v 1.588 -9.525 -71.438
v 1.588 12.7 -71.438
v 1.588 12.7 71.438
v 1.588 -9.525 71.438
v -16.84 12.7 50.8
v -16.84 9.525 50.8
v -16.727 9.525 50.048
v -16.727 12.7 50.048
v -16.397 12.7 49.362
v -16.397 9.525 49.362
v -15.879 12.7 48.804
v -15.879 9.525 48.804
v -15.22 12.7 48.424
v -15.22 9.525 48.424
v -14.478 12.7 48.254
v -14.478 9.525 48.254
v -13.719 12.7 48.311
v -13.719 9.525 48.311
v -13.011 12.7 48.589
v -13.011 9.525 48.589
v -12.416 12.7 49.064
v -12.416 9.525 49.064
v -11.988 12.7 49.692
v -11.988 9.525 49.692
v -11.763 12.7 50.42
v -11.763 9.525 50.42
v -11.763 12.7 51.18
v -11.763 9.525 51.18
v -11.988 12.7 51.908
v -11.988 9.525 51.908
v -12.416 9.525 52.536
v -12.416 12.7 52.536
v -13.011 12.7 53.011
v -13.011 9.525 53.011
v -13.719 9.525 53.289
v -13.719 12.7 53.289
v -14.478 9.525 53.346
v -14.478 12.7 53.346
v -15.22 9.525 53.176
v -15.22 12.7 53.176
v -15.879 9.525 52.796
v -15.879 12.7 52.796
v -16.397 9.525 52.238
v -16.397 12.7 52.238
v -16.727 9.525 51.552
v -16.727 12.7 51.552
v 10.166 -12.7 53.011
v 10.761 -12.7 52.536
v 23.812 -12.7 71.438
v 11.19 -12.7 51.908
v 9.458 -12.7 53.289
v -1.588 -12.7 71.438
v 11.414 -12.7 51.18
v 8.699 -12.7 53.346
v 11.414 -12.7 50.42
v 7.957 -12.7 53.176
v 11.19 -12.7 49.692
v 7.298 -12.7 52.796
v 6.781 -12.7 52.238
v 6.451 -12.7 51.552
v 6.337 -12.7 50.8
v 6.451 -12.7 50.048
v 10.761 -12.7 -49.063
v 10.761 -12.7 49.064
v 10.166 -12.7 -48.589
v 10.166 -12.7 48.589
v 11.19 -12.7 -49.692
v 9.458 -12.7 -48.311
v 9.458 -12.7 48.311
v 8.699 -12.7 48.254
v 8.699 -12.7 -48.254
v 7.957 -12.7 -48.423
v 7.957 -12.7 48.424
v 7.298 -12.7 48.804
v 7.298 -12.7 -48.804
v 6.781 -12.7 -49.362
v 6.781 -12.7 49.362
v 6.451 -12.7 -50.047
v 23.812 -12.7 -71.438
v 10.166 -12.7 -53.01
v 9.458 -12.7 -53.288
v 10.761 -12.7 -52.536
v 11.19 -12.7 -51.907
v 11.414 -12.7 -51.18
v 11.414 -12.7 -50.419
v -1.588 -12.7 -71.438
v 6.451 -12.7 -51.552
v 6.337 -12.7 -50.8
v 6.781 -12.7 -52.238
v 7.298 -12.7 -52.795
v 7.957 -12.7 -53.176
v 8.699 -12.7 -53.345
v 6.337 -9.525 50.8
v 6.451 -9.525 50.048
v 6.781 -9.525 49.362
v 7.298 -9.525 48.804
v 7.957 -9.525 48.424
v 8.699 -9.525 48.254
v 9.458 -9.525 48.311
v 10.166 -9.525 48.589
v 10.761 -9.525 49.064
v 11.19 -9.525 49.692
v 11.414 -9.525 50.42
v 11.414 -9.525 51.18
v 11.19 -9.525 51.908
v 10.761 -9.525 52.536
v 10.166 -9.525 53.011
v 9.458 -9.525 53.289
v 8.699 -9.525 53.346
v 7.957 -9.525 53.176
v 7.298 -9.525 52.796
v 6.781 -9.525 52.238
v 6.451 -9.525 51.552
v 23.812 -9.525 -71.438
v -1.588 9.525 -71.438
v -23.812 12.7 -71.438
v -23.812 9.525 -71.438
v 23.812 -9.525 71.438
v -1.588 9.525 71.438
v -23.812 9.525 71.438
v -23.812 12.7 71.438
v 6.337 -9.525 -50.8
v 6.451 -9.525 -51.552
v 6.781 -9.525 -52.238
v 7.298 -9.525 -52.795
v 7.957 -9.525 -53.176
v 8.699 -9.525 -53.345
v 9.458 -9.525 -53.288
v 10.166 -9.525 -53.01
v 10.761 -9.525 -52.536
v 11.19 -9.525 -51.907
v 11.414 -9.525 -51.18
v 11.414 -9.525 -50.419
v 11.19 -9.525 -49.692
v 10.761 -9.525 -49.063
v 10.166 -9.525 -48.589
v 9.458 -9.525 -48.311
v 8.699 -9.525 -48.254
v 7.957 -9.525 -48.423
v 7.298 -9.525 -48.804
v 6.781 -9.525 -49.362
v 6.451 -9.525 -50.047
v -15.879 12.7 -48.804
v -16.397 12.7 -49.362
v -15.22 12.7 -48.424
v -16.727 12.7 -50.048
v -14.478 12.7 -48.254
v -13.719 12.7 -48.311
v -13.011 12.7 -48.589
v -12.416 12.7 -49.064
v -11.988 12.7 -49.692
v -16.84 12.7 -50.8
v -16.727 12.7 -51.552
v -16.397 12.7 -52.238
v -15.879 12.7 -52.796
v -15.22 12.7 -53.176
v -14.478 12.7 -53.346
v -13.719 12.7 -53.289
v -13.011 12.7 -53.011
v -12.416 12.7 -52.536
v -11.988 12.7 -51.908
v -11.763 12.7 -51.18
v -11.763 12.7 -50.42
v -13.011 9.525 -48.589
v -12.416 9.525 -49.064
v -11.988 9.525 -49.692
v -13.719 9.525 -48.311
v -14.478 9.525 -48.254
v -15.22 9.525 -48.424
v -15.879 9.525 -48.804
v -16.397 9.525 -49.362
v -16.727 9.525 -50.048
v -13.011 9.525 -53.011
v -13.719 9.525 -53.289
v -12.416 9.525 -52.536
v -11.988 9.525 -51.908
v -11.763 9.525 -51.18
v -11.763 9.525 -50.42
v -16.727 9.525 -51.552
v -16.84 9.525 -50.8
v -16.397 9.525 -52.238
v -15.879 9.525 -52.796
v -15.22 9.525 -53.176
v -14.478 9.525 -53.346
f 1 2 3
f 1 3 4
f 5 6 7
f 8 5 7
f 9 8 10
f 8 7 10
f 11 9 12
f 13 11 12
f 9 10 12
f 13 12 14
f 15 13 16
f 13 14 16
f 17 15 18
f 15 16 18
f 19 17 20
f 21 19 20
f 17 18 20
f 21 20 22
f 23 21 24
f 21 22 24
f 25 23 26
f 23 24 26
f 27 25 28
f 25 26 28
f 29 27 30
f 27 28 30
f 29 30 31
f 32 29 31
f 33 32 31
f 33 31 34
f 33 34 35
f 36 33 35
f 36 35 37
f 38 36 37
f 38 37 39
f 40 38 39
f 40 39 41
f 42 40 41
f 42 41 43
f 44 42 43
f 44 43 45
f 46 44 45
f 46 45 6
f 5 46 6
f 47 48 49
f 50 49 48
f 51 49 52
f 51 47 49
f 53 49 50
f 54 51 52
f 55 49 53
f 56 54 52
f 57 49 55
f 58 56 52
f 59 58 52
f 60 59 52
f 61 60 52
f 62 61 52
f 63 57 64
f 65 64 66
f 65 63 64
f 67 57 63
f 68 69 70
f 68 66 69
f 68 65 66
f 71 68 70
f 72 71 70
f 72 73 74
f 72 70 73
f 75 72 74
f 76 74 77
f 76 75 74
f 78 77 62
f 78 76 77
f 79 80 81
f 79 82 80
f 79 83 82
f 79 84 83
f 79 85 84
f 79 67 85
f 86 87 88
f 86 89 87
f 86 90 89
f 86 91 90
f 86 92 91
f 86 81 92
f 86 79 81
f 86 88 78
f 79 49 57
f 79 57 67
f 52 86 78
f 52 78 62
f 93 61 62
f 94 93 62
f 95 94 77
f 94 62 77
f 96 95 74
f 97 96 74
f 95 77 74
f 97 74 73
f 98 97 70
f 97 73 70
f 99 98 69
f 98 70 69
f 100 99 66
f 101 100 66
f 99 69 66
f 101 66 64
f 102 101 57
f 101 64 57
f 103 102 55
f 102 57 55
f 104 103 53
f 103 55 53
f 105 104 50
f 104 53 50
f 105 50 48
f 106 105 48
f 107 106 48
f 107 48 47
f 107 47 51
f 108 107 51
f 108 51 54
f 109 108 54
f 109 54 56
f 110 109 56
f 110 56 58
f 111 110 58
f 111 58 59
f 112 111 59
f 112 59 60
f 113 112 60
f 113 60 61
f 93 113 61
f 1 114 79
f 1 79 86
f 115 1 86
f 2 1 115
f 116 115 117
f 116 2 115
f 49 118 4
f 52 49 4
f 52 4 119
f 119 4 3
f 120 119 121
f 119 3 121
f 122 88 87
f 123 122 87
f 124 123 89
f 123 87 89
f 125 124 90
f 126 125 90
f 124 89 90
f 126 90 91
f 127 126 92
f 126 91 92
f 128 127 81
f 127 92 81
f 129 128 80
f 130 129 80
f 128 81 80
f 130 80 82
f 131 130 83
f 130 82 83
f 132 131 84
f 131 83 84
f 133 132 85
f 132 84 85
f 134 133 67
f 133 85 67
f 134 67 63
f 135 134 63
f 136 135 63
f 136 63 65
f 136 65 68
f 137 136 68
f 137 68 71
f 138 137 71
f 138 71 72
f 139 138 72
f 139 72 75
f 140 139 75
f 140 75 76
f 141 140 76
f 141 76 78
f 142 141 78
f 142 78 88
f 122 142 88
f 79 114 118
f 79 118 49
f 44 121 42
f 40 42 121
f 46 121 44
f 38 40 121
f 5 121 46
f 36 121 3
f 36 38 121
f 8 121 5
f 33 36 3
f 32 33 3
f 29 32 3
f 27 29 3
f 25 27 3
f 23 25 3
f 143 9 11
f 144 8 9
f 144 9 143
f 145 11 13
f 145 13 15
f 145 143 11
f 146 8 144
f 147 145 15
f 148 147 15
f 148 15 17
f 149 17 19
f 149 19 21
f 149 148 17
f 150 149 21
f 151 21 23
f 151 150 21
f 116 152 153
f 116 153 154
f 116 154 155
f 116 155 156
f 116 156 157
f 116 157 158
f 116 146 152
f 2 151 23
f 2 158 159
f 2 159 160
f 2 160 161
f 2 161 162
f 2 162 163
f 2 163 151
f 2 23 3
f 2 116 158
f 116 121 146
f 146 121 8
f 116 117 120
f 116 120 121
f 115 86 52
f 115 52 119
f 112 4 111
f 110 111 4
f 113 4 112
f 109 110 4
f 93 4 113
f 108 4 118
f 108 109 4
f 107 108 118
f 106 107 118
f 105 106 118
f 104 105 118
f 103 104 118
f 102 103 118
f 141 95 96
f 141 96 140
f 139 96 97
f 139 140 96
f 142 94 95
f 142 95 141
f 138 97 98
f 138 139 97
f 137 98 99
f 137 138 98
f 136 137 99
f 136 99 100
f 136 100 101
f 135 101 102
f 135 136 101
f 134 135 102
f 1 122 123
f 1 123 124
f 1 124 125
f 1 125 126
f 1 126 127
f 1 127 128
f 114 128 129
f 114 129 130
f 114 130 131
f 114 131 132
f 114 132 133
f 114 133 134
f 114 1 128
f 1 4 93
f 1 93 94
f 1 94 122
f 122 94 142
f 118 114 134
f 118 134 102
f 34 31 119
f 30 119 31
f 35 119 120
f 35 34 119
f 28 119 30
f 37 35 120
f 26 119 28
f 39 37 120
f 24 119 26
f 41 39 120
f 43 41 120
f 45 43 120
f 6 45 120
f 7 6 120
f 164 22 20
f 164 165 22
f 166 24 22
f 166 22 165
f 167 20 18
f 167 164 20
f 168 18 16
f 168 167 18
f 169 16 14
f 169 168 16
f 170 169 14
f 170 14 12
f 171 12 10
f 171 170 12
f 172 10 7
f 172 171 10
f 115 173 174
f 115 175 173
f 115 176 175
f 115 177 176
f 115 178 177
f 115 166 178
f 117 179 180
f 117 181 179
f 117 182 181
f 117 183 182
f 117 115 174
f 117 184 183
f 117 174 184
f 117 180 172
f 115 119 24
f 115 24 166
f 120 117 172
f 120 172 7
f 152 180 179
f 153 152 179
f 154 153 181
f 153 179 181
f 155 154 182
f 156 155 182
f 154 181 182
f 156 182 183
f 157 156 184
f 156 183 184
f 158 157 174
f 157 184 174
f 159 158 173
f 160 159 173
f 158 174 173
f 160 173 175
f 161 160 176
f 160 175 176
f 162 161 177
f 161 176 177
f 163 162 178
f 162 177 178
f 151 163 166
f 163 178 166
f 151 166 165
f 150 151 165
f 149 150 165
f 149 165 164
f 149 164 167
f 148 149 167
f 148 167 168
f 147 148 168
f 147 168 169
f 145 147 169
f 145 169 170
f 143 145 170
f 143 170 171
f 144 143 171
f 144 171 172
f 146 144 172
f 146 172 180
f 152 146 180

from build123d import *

# Parameters (mm, degrees)
BOSS_EXTRUDE1_DEPTH      = 71.4375
BOSS_EXTRUDE1_DEPTH_BACK = 71.4375
F_10_CLEARANCE_HOLE1_D   = 5.1054
F_10_CLEARANCE_HOLE2_D   = 5.1054


with BuildPart() as part:
    # Sketch3 → Boss-Extrude1 (new, two sides: drawn at the far end of the back side and taken through both)
    with BuildSketch(Plane.XY.offset(-BOSS_EXTRUDE1_DEPTH_BACK)):
        Polygon((23.8125, -9.525), (23.8125, -12.7), (-1.5875, -12.7), (-1.5875, 9.525), (-23.8125, 9.525), (-23.8125, 12.7), (1.5875, 12.7), (1.5875, -9.525), align=None)
    extrude(amount=BOSS_EXTRUDE1_DEPTH + BOSS_EXTRUDE1_DEPTH_BACK)

    # #10 Clearance Hole1 (through all)
    with Locations(Plane(origin=(0, 12.7, 0), x_dir=(1, 0, 0), z_dir=(0, 1, 0))):
        with Locations((-14.2875, -50.799999492), (-14.2875, 50.800000508)):
            Hole(F_10_CLEARANCE_HOLE1_D / 2)

    # #10 Clearance Hole2 (through all)
    with Locations(Plane(origin=(0, -9.525, 0), x_dir=(1, 0, 0), z_dir=(0, 1, 0))):
        with Locations((8.89, -50.799999492), (8.89, 50.799700006)):
            Hole(F_10_CLEARANCE_HOLE2_D / 2)


solid = part.part
